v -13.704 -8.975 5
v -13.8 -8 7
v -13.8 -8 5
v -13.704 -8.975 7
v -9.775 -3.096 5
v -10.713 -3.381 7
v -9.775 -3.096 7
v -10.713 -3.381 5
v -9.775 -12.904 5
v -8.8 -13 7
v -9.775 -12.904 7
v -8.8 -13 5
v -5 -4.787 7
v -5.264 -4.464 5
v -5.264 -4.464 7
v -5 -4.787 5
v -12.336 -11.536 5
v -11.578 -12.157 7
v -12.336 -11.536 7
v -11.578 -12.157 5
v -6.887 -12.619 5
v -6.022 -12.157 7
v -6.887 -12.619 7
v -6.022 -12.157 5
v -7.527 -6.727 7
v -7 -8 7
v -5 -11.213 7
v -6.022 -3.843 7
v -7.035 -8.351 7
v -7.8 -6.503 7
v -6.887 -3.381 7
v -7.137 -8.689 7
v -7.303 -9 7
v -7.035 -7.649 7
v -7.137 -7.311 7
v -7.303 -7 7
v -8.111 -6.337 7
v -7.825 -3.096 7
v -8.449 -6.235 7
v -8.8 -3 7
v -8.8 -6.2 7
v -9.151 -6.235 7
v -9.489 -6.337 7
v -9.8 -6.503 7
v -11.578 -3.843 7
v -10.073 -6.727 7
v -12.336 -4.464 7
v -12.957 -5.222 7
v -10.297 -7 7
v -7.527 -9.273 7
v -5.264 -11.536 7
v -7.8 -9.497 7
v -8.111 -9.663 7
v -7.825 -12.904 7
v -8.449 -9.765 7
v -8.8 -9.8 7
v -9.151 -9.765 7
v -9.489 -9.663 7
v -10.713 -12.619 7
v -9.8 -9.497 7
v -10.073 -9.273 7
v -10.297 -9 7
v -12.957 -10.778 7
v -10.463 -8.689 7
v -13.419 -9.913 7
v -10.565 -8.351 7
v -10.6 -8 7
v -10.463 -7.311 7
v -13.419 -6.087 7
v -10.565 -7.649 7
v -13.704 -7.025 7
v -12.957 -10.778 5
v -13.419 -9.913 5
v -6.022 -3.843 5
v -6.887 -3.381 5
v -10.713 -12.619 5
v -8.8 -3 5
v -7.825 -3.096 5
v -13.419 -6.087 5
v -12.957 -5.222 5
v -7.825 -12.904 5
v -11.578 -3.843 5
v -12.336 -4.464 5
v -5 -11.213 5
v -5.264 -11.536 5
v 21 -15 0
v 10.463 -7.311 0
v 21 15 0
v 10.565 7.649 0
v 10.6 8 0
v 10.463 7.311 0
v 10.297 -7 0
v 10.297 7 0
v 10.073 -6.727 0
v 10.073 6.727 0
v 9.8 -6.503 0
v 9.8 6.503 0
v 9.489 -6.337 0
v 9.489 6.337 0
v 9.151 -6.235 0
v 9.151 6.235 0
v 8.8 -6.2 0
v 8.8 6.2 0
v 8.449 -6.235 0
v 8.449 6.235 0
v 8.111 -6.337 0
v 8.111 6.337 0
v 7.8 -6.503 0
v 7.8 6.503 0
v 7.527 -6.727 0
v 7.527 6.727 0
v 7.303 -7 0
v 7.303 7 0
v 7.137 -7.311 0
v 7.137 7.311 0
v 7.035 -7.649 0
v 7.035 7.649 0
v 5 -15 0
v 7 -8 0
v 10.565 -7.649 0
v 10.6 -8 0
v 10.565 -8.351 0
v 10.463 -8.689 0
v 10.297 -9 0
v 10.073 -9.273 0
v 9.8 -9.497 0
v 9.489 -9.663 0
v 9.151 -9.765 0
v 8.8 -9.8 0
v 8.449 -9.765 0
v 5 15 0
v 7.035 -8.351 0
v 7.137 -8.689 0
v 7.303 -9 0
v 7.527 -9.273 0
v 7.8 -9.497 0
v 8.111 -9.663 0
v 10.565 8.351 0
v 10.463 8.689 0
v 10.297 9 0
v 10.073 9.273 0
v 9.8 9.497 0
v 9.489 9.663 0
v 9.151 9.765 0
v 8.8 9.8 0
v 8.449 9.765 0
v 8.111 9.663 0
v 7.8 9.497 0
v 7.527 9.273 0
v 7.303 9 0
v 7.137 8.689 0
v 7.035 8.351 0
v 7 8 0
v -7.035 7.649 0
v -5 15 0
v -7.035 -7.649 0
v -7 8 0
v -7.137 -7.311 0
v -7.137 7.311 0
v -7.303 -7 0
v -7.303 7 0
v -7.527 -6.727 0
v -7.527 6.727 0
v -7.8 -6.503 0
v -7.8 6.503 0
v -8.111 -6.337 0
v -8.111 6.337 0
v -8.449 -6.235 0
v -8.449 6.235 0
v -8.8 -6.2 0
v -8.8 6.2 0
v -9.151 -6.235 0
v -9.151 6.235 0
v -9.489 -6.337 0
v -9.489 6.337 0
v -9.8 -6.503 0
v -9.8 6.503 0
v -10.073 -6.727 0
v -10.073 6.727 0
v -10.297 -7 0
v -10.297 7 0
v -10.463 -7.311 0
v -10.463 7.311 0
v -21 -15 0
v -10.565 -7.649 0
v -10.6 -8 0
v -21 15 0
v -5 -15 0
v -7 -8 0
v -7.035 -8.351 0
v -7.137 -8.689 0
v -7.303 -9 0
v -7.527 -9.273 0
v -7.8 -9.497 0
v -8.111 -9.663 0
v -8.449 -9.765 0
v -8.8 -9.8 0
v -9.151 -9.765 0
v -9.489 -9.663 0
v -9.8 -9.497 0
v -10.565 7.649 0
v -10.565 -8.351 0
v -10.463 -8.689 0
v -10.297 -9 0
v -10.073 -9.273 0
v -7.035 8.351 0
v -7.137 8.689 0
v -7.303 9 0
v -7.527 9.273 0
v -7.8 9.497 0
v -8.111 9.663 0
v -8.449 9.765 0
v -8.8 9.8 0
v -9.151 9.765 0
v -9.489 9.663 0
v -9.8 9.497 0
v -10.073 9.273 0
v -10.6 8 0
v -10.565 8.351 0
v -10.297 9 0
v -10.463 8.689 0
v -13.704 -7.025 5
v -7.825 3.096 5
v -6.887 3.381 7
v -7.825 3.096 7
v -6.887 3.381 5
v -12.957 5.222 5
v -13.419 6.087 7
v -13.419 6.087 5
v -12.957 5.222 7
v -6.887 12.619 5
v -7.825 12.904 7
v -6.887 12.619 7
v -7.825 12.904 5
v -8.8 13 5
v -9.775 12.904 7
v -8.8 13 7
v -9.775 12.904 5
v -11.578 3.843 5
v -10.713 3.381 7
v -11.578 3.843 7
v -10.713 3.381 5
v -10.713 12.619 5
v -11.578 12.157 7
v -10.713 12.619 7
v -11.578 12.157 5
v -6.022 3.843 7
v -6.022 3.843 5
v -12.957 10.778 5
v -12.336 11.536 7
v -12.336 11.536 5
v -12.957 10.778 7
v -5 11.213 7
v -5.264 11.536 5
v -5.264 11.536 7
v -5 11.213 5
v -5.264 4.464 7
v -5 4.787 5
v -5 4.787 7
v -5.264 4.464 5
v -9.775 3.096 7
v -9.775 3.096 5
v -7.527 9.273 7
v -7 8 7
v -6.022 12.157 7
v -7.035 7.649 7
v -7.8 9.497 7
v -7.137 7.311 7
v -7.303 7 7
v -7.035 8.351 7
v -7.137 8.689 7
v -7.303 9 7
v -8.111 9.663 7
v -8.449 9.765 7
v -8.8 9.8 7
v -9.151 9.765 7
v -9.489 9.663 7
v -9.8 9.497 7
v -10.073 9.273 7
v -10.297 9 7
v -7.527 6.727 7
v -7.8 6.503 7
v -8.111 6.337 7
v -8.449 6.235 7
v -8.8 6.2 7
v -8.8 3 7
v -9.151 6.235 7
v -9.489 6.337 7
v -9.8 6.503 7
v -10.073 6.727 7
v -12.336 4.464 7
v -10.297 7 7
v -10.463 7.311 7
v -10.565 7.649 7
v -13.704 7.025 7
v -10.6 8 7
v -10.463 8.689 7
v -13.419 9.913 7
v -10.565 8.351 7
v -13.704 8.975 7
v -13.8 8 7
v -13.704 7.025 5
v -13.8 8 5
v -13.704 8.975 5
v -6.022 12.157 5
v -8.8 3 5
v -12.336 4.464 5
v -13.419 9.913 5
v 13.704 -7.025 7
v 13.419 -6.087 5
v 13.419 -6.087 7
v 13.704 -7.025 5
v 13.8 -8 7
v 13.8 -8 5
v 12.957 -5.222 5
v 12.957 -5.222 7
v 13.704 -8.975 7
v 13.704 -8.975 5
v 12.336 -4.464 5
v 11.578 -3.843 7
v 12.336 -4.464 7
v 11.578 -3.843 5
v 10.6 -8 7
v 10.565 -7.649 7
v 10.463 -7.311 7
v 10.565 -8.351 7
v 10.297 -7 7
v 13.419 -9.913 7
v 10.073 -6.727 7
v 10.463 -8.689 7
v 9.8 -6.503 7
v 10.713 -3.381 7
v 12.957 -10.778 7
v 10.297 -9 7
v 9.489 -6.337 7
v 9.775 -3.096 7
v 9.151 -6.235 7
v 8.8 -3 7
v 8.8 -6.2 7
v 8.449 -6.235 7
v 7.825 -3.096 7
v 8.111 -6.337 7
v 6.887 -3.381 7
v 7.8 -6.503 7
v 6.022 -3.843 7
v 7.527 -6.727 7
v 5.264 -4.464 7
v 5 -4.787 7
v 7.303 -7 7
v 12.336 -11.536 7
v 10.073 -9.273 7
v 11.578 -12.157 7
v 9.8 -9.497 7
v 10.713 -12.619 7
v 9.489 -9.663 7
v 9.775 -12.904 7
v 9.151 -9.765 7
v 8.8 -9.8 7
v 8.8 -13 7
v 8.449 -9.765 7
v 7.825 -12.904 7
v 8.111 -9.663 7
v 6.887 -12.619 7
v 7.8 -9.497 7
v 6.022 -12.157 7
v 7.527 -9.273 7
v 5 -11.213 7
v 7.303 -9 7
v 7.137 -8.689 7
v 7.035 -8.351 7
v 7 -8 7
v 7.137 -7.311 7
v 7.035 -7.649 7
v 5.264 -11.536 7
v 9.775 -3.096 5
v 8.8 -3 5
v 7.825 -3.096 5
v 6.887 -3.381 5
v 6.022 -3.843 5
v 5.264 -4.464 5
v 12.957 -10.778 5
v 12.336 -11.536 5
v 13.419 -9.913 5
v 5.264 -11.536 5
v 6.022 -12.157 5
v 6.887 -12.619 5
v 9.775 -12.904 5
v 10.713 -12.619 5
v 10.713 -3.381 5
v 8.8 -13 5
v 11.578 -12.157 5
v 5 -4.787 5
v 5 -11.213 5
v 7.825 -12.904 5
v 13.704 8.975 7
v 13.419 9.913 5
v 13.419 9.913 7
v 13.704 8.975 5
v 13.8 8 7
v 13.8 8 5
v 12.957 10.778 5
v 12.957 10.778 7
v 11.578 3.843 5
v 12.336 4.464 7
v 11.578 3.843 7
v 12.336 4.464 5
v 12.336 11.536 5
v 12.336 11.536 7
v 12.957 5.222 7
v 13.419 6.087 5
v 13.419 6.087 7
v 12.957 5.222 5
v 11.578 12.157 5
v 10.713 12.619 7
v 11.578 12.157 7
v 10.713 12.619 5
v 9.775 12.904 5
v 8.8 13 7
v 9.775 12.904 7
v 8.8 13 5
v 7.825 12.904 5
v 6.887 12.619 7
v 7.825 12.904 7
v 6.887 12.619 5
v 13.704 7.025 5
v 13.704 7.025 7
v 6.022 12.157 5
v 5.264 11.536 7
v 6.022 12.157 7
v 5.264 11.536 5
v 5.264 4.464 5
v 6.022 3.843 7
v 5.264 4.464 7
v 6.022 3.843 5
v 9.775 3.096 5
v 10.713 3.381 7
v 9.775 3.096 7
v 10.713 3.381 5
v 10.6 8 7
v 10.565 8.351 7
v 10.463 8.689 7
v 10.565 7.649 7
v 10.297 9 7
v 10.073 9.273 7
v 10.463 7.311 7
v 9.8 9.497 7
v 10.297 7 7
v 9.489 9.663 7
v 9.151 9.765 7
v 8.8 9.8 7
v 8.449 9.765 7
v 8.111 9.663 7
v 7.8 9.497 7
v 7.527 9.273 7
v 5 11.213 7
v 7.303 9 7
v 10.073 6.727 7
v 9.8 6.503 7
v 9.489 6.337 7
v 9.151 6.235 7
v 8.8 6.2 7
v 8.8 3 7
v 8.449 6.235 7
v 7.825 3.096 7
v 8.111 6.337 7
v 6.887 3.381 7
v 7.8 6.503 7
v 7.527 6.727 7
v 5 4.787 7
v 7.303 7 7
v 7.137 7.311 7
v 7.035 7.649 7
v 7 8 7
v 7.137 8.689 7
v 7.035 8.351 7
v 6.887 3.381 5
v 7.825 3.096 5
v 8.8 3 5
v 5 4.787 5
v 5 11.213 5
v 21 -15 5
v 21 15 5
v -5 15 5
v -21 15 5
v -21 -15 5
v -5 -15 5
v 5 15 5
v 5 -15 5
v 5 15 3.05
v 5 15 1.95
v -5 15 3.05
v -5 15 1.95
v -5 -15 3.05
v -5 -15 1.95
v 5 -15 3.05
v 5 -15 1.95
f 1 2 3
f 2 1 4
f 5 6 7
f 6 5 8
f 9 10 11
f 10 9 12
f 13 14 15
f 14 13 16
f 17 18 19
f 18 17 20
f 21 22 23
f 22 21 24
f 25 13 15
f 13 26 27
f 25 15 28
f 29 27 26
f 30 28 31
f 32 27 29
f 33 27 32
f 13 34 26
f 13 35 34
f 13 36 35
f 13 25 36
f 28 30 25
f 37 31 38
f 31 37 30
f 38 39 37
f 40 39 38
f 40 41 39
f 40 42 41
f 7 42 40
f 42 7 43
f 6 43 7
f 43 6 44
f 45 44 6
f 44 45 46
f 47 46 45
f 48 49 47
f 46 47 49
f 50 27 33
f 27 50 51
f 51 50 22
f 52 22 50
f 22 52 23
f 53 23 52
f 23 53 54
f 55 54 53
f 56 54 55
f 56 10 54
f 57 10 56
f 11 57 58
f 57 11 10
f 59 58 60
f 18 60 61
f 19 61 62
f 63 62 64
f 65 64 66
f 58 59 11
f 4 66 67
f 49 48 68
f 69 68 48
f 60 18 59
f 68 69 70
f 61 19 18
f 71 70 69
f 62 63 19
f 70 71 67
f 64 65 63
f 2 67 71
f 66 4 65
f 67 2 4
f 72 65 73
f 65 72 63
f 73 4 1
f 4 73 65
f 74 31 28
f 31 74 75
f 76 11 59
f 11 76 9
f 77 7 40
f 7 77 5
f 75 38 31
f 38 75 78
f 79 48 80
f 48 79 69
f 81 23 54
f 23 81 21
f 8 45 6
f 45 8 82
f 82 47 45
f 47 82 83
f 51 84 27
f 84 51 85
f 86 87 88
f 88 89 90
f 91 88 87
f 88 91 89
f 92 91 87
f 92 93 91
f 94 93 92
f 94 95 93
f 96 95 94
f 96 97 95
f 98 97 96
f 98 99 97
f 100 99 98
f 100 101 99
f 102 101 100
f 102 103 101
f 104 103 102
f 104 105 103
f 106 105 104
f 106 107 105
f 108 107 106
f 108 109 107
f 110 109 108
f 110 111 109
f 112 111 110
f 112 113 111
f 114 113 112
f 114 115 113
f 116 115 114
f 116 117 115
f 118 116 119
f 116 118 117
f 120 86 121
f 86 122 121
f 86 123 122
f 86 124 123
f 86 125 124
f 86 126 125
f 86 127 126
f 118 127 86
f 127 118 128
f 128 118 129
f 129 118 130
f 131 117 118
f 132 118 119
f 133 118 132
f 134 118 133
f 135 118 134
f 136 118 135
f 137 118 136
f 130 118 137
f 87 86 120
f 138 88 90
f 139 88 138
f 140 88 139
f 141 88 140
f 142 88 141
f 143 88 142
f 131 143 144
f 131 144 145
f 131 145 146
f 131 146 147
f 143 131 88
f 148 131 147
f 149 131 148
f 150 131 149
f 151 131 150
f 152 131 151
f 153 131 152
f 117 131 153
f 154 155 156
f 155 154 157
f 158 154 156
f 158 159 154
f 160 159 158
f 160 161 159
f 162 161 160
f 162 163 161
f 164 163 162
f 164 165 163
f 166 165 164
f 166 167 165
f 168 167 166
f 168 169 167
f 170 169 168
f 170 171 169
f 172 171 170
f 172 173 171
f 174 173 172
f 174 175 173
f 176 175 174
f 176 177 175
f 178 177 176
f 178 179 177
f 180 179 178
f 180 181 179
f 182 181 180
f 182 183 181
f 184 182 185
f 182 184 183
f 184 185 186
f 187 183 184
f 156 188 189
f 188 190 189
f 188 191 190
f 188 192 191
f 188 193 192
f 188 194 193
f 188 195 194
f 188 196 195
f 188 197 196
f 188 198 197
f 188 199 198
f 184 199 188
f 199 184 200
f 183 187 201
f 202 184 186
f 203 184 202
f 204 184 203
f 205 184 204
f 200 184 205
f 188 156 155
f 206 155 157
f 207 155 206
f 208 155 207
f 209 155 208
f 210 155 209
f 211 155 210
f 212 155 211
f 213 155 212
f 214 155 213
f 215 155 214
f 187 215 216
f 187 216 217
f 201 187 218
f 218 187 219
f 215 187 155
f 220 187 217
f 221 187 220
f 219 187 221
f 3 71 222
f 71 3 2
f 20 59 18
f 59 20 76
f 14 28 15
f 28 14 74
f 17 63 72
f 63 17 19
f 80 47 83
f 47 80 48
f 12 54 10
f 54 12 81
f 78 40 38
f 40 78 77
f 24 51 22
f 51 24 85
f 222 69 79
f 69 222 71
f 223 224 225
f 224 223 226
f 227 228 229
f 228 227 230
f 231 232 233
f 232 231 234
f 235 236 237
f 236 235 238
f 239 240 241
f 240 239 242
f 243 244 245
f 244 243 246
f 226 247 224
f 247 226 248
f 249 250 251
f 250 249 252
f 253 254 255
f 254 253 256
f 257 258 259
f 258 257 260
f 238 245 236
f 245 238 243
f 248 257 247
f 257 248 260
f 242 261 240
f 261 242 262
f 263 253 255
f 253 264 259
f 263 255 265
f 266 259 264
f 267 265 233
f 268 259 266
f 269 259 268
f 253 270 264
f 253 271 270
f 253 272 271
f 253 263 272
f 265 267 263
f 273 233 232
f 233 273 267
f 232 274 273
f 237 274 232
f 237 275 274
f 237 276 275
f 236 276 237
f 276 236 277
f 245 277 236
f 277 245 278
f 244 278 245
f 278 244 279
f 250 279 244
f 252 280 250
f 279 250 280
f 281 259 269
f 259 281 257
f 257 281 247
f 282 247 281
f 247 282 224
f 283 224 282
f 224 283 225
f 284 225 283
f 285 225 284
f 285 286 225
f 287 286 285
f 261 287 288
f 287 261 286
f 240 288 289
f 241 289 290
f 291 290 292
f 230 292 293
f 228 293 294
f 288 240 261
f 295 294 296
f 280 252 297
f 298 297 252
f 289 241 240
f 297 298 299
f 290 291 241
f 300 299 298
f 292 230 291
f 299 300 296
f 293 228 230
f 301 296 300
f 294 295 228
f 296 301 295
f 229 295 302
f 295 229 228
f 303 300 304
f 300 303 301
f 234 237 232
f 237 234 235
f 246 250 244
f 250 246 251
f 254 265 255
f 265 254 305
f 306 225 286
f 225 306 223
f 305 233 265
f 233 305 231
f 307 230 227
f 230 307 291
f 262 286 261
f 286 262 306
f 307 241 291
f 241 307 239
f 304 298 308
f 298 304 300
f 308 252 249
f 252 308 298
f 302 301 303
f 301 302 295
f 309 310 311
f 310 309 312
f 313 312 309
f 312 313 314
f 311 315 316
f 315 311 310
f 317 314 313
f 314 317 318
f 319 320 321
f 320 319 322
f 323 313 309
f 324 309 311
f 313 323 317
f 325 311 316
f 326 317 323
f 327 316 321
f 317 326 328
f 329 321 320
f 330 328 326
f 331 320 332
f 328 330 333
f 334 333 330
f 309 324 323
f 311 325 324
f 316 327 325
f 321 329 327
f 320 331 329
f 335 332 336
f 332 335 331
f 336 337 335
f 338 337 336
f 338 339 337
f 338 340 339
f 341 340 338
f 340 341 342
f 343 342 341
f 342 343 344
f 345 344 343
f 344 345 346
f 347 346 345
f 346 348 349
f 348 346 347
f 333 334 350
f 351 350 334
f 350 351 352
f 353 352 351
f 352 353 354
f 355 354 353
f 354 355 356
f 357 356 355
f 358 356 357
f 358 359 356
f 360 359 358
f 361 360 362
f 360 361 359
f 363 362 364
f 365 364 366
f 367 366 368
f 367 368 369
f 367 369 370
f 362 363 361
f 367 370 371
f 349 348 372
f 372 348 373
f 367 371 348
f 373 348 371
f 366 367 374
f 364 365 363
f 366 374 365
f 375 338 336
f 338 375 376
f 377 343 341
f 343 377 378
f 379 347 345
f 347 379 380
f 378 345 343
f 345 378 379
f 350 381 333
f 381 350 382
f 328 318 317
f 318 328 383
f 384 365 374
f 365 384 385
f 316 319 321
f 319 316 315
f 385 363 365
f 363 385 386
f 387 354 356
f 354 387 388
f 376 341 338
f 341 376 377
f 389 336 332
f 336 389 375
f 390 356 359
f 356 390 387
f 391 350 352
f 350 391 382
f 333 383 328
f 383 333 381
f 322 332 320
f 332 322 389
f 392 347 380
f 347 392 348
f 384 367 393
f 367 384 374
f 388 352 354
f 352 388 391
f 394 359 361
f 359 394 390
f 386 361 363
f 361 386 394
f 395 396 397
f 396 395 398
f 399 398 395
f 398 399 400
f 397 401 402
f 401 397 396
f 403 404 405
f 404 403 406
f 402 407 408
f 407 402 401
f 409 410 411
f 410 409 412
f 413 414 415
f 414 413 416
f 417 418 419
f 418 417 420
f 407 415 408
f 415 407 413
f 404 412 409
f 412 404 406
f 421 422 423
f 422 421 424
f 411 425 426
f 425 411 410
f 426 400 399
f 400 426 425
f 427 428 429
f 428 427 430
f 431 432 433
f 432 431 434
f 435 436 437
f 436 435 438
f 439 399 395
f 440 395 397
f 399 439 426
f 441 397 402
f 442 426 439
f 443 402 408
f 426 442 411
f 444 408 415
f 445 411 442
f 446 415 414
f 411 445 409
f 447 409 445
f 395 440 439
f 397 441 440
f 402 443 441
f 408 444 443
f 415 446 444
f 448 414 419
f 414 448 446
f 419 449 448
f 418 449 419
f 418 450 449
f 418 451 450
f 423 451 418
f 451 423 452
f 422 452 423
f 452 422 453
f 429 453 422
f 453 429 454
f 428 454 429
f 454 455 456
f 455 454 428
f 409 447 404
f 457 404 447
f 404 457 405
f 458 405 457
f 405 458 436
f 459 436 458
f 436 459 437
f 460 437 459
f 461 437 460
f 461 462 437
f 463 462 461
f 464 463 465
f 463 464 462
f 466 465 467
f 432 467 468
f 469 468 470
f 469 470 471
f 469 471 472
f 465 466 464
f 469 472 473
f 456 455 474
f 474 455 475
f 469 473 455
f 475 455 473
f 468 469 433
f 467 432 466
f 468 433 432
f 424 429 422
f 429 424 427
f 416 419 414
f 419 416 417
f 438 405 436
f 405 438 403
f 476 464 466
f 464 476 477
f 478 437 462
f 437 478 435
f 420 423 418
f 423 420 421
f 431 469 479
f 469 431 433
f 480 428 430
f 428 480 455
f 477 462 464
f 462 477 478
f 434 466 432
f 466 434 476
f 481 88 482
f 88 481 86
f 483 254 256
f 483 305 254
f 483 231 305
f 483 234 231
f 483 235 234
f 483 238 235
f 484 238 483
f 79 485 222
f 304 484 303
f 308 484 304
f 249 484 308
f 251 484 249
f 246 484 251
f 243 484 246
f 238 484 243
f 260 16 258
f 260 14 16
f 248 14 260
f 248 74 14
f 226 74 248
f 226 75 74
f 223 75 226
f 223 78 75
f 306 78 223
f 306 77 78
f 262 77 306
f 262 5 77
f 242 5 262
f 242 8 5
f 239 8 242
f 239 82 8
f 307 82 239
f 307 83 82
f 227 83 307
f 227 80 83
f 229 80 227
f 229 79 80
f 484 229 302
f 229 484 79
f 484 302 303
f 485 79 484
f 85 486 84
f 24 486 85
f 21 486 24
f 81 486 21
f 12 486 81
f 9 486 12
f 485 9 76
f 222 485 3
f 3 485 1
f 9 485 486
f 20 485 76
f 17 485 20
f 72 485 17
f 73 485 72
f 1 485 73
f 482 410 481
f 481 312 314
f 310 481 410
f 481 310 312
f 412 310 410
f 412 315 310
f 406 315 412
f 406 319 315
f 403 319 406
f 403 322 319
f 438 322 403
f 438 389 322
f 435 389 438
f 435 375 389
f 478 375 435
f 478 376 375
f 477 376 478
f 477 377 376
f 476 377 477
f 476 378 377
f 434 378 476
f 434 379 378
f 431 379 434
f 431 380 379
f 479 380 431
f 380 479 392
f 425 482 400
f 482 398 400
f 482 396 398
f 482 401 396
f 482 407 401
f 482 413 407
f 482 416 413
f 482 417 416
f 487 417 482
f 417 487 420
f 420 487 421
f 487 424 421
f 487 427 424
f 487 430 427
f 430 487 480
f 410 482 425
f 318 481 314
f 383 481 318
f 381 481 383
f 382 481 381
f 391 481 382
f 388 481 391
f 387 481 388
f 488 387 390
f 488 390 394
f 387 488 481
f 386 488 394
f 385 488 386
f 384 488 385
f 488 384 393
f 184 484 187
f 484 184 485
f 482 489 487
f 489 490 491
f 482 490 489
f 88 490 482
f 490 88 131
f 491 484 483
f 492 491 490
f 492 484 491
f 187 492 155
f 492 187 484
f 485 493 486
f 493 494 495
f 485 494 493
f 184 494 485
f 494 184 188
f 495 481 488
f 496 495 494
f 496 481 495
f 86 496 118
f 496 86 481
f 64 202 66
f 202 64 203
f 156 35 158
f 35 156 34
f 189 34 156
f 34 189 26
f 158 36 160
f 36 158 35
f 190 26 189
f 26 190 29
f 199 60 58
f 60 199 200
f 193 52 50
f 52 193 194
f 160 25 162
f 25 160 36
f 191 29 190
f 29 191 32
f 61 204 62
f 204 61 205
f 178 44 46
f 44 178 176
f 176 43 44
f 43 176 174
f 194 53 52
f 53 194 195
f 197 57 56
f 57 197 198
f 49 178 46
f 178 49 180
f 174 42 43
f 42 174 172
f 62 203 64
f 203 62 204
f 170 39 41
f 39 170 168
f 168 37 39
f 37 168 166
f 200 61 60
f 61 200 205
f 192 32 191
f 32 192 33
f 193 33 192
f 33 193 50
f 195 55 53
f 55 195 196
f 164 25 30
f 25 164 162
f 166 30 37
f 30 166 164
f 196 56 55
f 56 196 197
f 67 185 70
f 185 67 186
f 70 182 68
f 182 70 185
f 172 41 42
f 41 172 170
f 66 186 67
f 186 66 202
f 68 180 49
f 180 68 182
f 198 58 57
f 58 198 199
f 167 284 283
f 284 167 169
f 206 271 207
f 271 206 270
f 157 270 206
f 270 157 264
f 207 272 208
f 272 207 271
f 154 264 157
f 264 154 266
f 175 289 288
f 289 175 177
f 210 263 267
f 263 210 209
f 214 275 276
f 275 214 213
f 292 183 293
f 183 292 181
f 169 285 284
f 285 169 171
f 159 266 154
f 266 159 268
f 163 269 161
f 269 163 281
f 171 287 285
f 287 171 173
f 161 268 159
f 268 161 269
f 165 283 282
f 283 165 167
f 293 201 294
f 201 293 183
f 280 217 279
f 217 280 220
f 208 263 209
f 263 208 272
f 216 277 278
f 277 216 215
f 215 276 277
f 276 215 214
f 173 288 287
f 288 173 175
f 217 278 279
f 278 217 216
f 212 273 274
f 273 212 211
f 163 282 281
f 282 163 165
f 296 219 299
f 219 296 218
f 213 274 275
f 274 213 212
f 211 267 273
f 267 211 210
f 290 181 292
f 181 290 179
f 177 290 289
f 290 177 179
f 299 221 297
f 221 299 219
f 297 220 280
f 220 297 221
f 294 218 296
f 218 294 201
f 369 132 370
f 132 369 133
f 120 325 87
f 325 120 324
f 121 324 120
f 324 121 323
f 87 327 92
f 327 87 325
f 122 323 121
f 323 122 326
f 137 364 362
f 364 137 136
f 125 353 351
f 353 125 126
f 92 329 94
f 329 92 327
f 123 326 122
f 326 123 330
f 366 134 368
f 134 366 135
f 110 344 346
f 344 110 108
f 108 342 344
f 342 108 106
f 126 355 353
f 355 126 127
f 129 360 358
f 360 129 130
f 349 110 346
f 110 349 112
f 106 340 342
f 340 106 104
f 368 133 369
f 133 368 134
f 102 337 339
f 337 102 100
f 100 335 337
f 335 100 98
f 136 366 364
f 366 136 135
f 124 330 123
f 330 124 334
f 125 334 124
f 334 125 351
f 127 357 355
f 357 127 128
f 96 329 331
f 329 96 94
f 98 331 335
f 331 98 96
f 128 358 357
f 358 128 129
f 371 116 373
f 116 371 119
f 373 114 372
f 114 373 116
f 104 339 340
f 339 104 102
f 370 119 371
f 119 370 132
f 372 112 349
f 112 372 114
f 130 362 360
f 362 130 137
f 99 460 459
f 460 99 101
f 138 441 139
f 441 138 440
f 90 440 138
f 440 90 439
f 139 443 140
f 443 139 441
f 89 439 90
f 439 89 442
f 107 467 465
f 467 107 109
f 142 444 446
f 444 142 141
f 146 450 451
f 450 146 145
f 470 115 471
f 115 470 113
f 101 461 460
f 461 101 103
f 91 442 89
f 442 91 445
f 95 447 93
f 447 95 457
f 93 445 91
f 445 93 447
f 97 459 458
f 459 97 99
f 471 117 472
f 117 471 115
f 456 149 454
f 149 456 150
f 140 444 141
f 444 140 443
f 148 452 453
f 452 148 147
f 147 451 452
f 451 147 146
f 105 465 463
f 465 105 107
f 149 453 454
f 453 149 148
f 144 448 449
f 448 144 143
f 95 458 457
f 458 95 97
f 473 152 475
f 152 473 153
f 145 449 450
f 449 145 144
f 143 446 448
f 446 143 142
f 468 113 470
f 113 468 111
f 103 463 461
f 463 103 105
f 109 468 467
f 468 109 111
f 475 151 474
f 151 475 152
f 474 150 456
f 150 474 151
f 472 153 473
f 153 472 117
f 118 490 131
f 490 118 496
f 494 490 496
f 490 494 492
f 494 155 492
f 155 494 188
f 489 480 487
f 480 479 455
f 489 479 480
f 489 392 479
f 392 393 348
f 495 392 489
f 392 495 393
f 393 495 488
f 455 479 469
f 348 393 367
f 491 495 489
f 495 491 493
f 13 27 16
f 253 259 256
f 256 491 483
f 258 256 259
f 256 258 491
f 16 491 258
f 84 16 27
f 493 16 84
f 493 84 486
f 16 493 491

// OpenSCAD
$fn = 32;

// ----------------------------------------------------------------------
// Living hinge: 42 x 30 mm plates, 1.1 mm flexible web
// ----------------------------------------------------------------------

// --- parameters (mm) ---
plate_len = 16;           // plate length outside the web
plate_w = 30;             // plate width
thick = 5;                // plate thickness
web_half = 5;             // half width of the flex band
web_t = 1.1;              // flexible web thickness
web_z = 1.95;             // web position inside the thickness
boss_d = 10;              // screw boss diameter
boss_h = 7;               // screw boss height
boss_x = 8.8;             // screw boss distance from the web
screw_d = 3.6;            // screw hole

difference() {
  union() {
    /* one flat strip, later thinned at the middle */
    translate([-21, -15, 0]) cube([42, 30, 5]);
    /* screw bosses, sunk 0.5 mm into the plates */
    for (sx = [-8.8, 8.8]) {
      for (sy = [-8, 8]) {
        translate([sx, sy, 0]) cylinder(h = boss_h, d = boss_d);
      }
    }
  }
  /* channel from below: leaves the web on top of it */
  translate([-5, -17.5, -2.5]) cube([10, 35, 4.45]);
  /* channel from above: thins the web down to web_t */
  translate([-5, -17.5, 3.05]) cube([10, 35, 4.45]);
  /* screw holes through the bosses */
  for (sx = [-8.8, 8.8]) {
    for (sy = [-8, 8]) {
      translate([sx, sy, -2.5]) cylinder(h = boss_h + 5, d = screw_d);
    }
  }
}
